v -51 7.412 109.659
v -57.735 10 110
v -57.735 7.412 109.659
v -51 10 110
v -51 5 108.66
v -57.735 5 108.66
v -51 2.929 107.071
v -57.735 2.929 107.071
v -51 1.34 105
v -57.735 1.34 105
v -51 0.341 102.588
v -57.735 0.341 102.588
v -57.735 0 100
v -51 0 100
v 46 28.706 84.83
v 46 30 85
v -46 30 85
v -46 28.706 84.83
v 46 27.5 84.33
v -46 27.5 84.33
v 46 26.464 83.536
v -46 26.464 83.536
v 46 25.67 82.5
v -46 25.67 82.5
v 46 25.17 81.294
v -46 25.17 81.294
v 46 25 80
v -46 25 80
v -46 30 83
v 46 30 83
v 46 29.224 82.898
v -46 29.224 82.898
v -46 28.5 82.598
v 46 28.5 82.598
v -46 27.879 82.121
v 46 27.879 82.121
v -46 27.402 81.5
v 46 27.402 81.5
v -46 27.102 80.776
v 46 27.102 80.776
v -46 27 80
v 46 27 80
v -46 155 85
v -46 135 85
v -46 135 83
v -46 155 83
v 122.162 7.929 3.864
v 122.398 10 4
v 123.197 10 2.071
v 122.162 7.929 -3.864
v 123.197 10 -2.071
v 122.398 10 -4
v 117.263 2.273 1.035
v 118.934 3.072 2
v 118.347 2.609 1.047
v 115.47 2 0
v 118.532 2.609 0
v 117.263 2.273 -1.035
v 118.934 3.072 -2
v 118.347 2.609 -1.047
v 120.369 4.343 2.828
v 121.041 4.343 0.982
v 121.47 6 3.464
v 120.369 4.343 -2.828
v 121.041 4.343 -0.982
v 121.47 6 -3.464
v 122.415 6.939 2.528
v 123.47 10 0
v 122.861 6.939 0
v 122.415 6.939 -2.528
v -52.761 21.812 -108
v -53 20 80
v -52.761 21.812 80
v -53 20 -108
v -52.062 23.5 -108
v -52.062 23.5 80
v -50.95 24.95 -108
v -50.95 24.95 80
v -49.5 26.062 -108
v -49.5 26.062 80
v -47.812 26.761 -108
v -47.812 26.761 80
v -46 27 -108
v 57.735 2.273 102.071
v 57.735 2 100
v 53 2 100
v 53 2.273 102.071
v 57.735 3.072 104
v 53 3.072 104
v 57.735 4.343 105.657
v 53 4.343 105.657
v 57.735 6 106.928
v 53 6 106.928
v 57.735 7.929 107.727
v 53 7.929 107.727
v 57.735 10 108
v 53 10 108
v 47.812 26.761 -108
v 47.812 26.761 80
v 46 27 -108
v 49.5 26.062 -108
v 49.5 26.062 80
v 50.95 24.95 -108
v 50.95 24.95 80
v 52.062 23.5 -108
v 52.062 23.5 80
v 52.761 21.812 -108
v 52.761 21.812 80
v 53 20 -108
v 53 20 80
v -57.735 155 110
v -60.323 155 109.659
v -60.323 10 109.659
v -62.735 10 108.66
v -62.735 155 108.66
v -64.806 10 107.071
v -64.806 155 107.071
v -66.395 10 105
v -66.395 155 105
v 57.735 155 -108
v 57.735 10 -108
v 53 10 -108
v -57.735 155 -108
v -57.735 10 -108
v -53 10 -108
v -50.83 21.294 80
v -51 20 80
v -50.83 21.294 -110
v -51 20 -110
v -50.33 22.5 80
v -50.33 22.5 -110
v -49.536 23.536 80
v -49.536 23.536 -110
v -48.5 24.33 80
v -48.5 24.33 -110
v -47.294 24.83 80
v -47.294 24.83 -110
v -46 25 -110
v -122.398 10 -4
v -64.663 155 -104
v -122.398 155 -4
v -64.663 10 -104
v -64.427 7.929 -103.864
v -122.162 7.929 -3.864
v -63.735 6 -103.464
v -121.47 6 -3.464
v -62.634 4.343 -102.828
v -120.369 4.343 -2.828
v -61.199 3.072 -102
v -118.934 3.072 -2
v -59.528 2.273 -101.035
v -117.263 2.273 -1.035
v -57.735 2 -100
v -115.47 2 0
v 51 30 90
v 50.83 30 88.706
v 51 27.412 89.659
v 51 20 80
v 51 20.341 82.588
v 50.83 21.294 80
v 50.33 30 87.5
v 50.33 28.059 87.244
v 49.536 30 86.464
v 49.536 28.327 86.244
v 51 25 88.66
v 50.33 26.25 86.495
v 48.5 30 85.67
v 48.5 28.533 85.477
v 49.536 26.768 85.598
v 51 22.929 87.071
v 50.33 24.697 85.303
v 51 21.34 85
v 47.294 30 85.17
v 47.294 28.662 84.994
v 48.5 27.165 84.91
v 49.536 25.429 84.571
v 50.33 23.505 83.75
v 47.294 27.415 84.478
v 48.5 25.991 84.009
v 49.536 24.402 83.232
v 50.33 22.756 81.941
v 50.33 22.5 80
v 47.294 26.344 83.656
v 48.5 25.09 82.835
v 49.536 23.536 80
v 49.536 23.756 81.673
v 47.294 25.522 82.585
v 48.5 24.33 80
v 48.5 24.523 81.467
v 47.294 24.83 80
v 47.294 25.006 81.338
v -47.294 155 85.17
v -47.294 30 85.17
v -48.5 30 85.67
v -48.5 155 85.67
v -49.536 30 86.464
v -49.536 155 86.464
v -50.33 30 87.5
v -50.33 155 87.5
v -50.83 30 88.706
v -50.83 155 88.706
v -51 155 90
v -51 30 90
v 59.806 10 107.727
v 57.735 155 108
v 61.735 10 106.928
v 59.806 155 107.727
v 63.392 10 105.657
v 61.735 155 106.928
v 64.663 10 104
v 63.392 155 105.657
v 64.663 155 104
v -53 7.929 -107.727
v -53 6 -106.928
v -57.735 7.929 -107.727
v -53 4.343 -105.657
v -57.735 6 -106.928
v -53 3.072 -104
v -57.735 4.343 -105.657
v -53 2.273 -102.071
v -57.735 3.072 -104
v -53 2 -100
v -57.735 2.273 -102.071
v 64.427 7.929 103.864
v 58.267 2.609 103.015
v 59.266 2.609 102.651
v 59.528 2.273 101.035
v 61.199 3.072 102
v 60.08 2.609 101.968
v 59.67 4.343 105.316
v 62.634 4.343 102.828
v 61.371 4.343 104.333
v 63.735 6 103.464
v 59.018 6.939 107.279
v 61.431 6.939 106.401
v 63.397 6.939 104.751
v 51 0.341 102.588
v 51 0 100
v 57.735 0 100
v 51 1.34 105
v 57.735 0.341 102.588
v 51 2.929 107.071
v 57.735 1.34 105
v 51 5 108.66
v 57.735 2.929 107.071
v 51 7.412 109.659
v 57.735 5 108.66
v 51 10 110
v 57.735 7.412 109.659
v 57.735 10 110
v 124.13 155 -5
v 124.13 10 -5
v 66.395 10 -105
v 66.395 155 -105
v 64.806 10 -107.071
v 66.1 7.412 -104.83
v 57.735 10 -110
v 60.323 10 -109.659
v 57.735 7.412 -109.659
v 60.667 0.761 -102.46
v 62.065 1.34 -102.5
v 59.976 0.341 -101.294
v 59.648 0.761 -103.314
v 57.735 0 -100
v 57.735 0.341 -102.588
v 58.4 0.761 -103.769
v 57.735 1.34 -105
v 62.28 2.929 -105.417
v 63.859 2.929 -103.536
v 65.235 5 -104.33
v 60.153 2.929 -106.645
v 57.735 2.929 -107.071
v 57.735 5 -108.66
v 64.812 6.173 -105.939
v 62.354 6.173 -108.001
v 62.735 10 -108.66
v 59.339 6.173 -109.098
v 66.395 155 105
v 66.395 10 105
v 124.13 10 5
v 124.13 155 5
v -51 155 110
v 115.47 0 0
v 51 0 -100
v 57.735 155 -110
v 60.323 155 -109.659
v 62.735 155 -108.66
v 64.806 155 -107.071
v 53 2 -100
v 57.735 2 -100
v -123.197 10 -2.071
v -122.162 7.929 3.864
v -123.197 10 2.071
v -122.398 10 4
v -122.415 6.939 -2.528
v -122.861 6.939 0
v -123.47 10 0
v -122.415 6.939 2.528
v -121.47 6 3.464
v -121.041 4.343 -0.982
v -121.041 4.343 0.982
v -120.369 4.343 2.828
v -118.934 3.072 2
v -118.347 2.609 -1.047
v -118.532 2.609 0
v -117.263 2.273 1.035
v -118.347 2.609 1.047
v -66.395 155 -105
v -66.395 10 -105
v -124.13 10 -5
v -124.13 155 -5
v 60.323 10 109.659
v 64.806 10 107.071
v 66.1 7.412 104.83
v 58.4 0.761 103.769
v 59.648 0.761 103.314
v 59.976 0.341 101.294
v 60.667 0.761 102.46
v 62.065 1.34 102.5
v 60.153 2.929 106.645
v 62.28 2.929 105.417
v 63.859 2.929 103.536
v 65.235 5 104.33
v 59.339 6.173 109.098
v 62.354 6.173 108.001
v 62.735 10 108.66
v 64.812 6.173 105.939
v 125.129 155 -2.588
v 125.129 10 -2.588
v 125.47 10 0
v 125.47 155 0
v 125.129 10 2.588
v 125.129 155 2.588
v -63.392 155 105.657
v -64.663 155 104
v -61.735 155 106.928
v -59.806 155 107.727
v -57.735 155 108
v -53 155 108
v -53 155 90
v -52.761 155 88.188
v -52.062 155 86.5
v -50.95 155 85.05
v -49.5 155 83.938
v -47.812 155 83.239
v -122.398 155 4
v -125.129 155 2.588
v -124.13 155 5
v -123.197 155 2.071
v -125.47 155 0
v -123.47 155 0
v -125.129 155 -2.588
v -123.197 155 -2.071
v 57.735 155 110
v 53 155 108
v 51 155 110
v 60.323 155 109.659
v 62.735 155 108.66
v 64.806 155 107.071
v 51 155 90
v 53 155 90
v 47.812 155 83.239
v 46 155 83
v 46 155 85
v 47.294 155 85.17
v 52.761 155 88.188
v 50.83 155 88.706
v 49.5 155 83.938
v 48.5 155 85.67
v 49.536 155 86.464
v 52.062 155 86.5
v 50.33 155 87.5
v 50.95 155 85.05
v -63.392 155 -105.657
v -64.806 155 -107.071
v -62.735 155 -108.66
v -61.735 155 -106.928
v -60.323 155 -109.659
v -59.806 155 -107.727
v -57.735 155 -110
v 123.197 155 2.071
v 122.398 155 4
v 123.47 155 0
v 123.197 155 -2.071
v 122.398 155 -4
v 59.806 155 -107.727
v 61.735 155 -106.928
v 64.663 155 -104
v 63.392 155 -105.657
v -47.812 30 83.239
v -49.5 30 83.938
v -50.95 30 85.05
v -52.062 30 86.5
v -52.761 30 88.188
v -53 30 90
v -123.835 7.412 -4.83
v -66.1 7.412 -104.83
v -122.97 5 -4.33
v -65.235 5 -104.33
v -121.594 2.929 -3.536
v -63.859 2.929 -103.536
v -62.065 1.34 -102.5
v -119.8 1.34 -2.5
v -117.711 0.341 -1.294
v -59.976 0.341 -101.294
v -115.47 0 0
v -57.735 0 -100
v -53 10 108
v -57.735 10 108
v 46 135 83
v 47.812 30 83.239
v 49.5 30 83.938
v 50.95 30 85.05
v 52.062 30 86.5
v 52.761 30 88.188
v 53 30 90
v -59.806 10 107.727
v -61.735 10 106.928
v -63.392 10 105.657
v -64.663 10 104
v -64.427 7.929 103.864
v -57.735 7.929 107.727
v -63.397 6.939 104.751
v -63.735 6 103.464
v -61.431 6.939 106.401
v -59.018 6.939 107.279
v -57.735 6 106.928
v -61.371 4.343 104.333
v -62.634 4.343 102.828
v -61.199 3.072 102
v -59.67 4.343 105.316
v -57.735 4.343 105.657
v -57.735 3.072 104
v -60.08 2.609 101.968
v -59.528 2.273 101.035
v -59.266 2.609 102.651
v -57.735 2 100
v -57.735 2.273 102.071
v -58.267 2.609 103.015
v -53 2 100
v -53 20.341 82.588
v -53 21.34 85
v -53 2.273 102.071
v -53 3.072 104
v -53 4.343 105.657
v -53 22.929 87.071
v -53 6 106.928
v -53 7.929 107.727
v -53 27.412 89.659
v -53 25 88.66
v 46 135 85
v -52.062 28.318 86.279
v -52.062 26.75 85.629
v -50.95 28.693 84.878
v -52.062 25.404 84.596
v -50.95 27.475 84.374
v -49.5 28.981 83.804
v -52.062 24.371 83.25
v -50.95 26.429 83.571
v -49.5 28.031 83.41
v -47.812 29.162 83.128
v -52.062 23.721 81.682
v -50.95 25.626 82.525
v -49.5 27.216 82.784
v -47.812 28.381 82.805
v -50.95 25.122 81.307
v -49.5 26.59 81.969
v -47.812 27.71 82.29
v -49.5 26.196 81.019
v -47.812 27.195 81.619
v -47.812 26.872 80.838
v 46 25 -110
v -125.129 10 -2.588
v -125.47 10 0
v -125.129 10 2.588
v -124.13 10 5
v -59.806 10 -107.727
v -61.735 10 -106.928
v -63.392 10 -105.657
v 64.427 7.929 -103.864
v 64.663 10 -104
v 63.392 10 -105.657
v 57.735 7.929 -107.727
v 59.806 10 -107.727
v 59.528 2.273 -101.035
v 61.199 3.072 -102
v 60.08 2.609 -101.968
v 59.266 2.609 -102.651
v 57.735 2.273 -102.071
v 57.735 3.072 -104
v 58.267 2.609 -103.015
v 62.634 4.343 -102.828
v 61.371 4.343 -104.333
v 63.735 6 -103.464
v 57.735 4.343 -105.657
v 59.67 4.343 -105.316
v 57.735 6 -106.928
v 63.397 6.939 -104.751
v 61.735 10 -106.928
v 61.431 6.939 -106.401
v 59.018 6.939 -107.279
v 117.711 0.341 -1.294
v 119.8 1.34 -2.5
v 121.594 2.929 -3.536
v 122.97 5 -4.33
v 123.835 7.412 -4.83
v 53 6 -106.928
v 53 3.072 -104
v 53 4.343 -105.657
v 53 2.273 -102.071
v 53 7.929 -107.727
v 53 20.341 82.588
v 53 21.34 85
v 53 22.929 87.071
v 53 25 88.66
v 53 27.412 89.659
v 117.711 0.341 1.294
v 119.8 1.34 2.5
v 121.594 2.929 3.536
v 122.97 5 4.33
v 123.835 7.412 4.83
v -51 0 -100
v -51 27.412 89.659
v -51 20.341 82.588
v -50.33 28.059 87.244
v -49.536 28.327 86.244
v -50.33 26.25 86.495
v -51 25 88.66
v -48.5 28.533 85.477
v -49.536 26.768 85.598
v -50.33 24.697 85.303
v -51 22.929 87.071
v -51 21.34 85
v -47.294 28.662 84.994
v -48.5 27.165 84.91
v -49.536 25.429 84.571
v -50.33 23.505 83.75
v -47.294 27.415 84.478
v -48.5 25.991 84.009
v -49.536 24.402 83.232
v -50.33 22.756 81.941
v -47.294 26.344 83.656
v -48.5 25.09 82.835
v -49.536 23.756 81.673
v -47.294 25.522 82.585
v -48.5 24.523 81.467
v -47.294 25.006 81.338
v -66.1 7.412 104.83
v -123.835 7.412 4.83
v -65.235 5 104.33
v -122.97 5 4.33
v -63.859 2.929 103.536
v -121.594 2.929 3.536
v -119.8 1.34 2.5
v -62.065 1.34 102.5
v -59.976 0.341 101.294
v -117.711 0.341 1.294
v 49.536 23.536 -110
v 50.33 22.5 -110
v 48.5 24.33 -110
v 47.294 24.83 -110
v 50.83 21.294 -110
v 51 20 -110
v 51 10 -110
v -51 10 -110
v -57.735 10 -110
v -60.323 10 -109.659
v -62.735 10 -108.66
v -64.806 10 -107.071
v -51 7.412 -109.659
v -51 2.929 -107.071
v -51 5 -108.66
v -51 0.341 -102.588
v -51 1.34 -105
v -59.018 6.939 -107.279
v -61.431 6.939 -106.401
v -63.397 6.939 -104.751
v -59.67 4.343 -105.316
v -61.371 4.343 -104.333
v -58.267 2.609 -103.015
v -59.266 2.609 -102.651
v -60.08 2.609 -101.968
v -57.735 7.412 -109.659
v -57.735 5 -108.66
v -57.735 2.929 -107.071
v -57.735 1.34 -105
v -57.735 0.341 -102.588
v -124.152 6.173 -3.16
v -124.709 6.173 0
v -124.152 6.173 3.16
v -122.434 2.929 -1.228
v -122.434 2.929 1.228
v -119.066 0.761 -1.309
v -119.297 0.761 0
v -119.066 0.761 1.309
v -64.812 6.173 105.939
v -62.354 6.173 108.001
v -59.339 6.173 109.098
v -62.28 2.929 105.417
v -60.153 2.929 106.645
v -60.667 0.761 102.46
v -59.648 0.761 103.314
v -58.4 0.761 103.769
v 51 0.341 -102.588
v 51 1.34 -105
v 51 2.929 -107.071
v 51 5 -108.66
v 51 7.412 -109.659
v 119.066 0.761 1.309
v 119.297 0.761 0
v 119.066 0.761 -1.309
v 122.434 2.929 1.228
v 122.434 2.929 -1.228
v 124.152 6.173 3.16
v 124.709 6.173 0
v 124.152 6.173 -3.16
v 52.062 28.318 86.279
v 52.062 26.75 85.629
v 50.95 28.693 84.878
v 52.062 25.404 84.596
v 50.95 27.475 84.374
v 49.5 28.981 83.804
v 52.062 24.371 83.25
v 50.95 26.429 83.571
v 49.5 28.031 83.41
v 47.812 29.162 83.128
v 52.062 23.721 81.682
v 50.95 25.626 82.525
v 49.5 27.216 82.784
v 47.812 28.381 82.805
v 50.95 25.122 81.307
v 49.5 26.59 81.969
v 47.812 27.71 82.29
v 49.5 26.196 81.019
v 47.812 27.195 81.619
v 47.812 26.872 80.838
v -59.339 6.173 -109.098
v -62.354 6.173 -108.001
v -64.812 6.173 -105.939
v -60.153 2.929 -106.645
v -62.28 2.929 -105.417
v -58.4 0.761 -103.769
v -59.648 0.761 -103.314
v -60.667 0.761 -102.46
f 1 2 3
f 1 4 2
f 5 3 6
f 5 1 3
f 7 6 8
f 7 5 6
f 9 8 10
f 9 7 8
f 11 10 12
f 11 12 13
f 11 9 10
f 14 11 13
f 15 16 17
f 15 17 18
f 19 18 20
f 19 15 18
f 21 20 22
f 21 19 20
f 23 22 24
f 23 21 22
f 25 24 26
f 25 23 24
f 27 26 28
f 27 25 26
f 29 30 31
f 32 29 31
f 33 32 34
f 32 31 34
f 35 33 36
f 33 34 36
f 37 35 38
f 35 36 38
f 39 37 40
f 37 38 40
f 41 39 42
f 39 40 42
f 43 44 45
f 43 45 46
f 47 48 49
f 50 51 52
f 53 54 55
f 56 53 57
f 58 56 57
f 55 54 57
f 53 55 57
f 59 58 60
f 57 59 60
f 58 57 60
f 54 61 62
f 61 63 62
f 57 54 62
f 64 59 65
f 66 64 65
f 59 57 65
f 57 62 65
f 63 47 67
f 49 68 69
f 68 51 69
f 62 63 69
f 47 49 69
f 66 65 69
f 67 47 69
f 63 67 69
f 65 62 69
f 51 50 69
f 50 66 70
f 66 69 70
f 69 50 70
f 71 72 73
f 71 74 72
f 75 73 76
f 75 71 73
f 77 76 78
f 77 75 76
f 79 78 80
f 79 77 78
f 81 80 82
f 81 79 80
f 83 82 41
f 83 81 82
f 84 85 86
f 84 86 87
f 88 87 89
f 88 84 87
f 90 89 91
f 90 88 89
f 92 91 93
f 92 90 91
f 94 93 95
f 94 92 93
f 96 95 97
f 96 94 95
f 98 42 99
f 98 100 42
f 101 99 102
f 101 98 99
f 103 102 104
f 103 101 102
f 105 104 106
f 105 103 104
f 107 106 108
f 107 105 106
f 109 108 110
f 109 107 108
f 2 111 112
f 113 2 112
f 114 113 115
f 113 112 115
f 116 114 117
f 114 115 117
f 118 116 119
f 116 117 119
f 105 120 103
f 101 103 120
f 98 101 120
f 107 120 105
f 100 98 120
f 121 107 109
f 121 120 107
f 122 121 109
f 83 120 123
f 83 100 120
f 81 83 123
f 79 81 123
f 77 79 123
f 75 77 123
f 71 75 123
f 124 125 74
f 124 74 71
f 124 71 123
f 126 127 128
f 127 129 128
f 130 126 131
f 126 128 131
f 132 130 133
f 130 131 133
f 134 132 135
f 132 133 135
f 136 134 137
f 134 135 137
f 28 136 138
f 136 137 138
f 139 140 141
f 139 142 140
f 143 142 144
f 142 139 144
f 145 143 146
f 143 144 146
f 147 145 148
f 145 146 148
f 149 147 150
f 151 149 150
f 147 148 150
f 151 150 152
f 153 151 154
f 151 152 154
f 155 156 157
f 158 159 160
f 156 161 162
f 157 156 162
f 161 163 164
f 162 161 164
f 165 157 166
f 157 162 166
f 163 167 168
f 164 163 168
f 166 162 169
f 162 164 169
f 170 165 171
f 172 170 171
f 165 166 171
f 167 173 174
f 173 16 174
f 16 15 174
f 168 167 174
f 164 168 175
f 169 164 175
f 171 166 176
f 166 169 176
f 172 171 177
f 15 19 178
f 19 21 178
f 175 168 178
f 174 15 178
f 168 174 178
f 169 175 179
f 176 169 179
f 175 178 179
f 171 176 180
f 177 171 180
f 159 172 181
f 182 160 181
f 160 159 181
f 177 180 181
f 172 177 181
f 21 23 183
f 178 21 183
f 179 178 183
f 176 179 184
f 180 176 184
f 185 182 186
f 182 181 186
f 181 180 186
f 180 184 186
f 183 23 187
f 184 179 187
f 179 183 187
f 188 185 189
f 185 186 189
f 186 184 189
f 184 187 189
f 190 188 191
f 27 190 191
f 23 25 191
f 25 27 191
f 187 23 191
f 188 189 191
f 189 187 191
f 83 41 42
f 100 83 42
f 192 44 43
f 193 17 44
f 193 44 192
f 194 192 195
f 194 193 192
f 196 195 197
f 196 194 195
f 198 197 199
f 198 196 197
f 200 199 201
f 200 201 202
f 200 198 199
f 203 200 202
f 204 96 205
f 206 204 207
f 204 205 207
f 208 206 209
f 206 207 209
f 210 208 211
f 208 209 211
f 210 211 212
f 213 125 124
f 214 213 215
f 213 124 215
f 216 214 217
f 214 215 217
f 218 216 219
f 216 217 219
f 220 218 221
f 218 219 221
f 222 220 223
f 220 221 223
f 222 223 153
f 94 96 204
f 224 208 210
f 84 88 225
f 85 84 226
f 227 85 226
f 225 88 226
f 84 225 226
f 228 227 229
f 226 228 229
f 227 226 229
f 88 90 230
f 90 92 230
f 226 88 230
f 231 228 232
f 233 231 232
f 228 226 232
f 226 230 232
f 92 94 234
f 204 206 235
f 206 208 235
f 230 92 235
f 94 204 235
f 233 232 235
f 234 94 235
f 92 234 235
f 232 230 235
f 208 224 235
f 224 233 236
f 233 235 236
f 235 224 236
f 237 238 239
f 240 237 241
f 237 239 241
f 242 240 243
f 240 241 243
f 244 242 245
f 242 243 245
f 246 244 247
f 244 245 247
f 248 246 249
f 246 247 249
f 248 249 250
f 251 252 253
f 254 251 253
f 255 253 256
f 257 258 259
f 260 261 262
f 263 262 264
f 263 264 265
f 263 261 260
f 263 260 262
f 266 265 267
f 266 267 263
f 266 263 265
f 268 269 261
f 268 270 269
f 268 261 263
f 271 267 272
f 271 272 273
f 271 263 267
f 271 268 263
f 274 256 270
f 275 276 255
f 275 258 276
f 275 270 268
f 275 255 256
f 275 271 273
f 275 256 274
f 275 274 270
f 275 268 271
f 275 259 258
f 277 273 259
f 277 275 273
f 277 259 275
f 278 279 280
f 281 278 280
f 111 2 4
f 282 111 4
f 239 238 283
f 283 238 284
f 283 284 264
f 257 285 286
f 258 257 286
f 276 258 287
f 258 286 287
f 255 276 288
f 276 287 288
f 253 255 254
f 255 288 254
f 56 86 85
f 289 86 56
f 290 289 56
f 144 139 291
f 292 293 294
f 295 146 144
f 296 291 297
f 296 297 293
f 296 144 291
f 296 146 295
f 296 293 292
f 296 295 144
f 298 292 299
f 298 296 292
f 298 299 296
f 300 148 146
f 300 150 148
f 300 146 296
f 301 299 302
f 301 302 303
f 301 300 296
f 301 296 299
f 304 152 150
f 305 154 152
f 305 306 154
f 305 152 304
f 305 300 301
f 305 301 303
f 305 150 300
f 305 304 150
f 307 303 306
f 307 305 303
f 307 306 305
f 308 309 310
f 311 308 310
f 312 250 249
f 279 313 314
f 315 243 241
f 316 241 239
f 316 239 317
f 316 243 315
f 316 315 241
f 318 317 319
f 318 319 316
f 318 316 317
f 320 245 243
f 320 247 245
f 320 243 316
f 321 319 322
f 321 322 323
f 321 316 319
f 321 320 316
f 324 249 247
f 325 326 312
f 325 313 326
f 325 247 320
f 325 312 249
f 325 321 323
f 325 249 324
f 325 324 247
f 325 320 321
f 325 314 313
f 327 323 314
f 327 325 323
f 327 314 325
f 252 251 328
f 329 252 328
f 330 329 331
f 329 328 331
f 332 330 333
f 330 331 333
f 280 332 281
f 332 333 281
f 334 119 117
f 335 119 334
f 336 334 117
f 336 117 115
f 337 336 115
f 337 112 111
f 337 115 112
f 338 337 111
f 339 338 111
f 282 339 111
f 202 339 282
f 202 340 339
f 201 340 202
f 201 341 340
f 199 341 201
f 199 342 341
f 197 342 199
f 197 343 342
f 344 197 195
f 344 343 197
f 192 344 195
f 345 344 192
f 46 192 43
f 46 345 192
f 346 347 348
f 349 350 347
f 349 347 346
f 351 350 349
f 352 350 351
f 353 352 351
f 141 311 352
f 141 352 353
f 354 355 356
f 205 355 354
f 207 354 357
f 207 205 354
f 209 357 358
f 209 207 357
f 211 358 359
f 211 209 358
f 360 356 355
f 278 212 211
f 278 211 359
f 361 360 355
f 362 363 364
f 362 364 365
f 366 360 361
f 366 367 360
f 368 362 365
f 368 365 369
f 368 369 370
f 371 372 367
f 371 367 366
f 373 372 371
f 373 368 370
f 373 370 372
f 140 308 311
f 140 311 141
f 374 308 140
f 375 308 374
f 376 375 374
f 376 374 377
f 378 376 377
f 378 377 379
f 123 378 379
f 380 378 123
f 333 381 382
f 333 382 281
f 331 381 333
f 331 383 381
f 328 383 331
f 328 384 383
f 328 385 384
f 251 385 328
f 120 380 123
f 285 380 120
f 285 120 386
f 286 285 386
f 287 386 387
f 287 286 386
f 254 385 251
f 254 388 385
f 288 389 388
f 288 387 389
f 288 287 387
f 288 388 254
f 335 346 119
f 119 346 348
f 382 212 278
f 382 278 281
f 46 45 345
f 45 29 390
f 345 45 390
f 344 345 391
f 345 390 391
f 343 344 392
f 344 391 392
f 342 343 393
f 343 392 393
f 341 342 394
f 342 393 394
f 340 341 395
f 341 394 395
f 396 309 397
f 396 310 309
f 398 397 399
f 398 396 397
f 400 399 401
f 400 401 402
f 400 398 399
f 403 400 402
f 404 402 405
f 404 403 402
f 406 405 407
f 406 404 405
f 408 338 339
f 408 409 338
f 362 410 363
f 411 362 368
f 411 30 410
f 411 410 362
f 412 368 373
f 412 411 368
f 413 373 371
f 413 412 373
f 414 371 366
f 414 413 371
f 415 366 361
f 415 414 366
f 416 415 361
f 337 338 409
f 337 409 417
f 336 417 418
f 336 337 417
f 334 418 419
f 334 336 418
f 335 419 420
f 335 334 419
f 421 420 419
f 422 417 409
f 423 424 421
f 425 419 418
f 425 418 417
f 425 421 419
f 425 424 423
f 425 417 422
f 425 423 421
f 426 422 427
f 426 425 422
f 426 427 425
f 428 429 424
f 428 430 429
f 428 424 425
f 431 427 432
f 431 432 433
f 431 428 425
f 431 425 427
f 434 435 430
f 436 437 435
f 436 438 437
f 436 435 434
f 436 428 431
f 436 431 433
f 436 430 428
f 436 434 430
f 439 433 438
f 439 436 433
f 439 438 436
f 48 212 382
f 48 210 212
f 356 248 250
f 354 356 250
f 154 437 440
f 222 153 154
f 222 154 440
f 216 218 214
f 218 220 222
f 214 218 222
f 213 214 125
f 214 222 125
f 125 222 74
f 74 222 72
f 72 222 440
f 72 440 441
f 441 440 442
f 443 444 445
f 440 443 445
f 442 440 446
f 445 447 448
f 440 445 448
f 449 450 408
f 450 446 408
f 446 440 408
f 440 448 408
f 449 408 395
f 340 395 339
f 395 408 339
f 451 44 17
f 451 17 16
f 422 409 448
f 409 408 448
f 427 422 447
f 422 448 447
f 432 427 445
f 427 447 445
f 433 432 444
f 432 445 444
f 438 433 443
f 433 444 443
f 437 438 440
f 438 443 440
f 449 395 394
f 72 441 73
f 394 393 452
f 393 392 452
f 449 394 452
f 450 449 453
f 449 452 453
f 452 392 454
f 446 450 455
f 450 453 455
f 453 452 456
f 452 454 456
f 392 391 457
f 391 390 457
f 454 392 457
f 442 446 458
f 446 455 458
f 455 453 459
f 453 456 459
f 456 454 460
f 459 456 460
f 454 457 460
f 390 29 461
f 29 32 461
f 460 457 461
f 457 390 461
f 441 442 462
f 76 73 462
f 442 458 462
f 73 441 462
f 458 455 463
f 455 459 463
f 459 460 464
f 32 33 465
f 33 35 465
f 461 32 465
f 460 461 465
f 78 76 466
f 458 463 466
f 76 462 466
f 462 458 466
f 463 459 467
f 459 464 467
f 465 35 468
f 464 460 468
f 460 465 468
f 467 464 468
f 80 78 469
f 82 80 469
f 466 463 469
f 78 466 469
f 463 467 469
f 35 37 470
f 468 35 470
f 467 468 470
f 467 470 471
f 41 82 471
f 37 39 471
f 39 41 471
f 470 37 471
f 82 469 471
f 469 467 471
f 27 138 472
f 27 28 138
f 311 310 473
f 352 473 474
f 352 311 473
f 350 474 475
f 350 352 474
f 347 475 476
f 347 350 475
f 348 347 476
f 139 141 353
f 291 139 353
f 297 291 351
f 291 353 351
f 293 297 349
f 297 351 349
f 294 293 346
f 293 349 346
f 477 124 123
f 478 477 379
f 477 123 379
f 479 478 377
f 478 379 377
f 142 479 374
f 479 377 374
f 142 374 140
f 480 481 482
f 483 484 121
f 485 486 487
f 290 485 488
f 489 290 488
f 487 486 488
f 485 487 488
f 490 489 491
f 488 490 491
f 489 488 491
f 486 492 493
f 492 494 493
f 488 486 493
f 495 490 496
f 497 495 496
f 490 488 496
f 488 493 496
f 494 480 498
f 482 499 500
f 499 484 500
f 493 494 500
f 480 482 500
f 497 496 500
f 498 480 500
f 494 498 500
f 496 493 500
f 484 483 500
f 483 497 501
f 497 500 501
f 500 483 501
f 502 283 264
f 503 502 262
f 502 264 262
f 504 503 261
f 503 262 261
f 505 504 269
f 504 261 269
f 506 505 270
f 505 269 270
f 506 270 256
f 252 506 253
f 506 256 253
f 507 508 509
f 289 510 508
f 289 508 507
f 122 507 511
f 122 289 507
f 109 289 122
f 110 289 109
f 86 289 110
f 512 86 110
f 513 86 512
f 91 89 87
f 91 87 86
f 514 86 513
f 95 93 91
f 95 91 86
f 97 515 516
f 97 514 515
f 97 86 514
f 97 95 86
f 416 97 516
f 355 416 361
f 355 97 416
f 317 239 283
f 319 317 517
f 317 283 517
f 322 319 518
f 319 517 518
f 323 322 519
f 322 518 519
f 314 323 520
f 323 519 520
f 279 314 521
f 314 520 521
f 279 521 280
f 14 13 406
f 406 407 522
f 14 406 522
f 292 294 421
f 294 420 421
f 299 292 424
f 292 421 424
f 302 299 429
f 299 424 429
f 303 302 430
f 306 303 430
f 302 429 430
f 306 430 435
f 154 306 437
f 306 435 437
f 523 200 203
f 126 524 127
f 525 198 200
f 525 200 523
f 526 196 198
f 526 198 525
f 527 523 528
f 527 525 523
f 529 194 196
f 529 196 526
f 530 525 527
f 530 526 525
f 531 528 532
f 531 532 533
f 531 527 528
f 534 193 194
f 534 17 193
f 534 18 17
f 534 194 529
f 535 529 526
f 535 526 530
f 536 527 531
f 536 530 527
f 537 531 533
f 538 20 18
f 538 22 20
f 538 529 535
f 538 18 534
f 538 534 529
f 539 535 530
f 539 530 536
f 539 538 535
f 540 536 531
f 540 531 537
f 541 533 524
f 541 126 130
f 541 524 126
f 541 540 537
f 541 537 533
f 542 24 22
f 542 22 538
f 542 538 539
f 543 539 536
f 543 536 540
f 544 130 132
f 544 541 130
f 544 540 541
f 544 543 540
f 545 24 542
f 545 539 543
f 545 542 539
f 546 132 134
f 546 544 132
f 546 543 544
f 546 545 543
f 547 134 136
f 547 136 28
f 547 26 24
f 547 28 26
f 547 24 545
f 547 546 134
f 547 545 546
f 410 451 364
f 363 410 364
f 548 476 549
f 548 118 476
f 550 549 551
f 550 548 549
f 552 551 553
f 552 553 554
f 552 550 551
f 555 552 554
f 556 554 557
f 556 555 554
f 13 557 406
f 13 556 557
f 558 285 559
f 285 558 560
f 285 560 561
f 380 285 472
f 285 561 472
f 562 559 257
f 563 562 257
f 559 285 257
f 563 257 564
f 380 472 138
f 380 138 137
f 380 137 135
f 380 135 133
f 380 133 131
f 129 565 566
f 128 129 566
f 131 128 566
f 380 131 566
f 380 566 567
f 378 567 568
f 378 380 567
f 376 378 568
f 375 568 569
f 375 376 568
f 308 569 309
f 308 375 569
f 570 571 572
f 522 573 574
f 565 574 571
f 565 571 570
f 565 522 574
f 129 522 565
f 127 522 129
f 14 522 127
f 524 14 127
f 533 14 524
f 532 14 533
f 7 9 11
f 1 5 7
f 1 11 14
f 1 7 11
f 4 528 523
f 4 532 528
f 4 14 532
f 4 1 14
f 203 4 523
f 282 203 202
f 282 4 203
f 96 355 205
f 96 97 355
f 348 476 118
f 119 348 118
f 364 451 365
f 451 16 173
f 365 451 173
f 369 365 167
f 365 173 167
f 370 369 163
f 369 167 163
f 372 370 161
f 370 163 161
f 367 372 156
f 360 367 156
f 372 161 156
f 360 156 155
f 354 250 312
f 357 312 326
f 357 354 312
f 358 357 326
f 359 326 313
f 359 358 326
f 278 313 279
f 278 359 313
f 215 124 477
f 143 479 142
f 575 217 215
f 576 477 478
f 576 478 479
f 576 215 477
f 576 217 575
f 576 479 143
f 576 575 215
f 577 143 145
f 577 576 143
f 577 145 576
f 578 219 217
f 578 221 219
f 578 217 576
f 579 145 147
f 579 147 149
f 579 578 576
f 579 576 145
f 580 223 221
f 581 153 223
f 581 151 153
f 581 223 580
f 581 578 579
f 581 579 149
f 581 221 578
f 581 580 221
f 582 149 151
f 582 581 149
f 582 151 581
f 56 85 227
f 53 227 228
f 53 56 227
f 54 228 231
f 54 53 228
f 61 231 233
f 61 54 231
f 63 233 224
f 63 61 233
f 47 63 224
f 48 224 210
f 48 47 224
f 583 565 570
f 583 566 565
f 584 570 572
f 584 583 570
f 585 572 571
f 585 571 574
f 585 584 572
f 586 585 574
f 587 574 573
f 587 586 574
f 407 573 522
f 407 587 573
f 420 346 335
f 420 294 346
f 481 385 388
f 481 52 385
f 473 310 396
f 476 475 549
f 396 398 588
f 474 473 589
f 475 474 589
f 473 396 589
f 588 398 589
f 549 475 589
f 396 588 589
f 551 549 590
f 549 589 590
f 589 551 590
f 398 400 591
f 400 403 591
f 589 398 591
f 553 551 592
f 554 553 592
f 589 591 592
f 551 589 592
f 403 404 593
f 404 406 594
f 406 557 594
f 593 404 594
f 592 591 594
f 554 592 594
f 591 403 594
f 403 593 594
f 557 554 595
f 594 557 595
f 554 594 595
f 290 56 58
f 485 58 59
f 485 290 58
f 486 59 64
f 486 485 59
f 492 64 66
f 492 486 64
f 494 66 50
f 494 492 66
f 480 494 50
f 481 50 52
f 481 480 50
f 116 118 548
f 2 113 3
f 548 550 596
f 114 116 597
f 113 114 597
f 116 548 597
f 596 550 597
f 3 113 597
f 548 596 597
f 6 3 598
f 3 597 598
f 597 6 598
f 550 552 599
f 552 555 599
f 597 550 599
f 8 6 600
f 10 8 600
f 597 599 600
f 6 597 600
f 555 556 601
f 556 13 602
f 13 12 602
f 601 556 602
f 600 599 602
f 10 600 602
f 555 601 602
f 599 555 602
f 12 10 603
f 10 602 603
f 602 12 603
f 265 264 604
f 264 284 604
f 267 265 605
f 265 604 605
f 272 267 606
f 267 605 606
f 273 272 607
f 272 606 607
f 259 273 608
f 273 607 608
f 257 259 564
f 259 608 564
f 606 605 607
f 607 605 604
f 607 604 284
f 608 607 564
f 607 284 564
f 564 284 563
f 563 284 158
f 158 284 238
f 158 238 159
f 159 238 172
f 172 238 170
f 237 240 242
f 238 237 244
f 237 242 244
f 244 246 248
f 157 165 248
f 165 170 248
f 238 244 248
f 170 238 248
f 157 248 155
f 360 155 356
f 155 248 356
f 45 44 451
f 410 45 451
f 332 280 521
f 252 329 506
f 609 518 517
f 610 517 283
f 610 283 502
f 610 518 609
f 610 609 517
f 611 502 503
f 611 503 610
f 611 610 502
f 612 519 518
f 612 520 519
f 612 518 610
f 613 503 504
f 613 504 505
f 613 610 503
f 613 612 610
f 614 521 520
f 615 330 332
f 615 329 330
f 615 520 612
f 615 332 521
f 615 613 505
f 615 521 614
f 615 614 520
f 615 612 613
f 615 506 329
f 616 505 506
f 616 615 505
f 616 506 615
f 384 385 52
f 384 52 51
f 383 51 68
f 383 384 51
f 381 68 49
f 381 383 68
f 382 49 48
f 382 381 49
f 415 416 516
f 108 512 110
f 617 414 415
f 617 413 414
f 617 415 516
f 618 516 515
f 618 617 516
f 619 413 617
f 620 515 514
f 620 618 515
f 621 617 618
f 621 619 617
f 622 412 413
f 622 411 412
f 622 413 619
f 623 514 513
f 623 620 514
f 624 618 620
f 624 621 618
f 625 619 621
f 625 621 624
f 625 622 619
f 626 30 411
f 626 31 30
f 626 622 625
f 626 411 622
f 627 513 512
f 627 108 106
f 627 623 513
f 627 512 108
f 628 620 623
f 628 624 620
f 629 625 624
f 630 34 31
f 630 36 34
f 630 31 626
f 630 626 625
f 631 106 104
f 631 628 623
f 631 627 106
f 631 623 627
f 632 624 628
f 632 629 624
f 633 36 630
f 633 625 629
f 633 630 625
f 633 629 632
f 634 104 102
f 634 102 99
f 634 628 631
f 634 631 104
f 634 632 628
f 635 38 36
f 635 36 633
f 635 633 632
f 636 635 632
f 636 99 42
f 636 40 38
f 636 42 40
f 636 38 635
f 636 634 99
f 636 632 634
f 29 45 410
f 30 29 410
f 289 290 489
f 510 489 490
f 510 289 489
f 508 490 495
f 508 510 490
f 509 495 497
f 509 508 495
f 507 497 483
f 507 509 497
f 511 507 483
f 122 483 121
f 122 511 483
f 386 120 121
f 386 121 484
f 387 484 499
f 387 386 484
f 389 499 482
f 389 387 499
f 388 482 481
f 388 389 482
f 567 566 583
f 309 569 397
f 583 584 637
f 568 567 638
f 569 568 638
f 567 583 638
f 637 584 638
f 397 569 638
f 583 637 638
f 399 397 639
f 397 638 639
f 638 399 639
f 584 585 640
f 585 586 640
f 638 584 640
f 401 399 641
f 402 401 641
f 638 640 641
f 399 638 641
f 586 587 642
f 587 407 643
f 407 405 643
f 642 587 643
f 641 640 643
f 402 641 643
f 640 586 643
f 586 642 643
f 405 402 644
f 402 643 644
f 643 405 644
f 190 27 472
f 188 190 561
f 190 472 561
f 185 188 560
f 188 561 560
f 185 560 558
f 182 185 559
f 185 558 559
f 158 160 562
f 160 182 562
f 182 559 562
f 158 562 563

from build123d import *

# Parameters (mm, degrees)
BOSS_EXTRUDE1_DEPTH = 155
CUT_EXTRUDE1_REACH  = 230.601
SKETCH2_W           = 102
SKETCH2_H           = 25
CUT_EXTRUDE2_REACH  = 281.613
SKETCH3_W           = 102
SKETCH3_H           = 25
FILLET1_R           = 5
FILLET2_R           = 10
FILLET4_R           = 10
SHELL1_T            = -2
CUT_EXTRUDE3_REACH  = 280.913
SKETCH9_W           = 92
SKETCH9_H           = 20


with BuildPart() as part:
    # Sketch1 → Boss-Extrude1 (new body)
    with BuildSketch(Plane(origin=(0, 0, 0), x_dir=(1, 0, 0), z_dir=(0, 1, 0))):
        Polygon((63.508529611, 110), (-63.508529611, 110), (-127.017059222, 0), (-63.508529611, -110), (63.508529611, -110), (127.017059222, 0), align=None)
    extrude(amount=BOSS_EXTRUDE1_DEPTH)

    # Sketch2 → Cut-Extrude1 (cut, up to next)
    with BuildSketch(Plane(origin=(0, 155, 0), x_dir=(1, 0, 0), z_dir=(0, 1, 0)), mode=Mode.PRIVATE) as cut_extrude1_sk1:
        with Locations((0, -97.5)):
            Rectangle(SKETCH2_W, SKETCH2_H)
    cut_extrude1_tool1 = extrude(cut_extrude1_sk1.sketch, amount=-CUT_EXTRUDE1_REACH, mode=Mode.PRIVATE) & part.part
    add(cut_extrude1_tool1.solids().sort_by_distance((0, 155, 97.5))[0], mode=Mode.SUBTRACT)

    # Sketch3 → Cut-Extrude2 (cut, up to next)
    with BuildSketch(Plane.XY.offset(85), mode=Mode.PRIVATE) as cut_extrude2_sk1:
        with Locations((0, 12.5)):
            Rectangle(SKETCH3_W, SKETCH3_H)
    cut_extrude2_tool1 = extrude(cut_extrude2_sk1.sketch, amount=-CUT_EXTRUDE2_REACH, mode=Mode.PRIVATE) & part.part
    add(cut_extrude2_tool1.solids().sort_by_distance((0, 12.5, 85))[0], mode=Mode.SUBTRACT)

    # Fillet1
    fillet1_edges = [part.edges().sort_by_distance(p)[0] for p in [
        (51, 90, 85),
        (-51, 90, 85),
        (-51, 25, -12.5),
        (51, 25, -12.5),
        (0, 25, 85),
    ]]
    fillet(fillet1_edges, radius=FILLET1_R)

    # Fillet2
    fillet2_edges = [part.edges().sort_by_distance(p)[0] for p in [
        (127.017059222, 77.5, 0),
        (63.508529611, 77.5, 110),
        (-63.508529611, 77.5, 110),
        (-127.017059222, 77.5, 0),
        (-63.508529611, 77.5, -110),
        (63.508529611, 77.5, -110),
    ]]
    fillet(fillet2_edges, radius=FILLET2_R)

    # Fillet4
    fillet4_edges = [part.edges().sort_by_distance(p)[0] for p in [
        (54.367513459, 0, 110),
        (-54.367513459, 0, -110),
        (95.262794416, 0, 55),
        (54.367513459, 0, -110),
        (95.262794416, 0, -55),
        (62.735026919, 0, -108.660254038),
        (125.470053838, 0, 0),
        (62.735026919, 0, 108.660254038),
        (-95.262794416, 0, -55),
        (-54.367513459, 0, 110),
        (-95.262794416, 0, 55),
        (-62.735026919, 0, 108.660254038),
        (-125.470053838, 0, 0),
        (-62.735026919, 0, -108.660254038),
    ]]
    fillet(fillet4_edges, radius=FILLET4_R)

    # Shell1
    shell1_openings = [part.faces().sort_by_distance(p)[0] for p in [
        (0, 155, -6.295757264),
    ]]
    offset(amount=SHELL1_T, openings=shell1_openings, kind=Kind.INTERSECTION)

    # Sketch9 → Cut-Extrude3 (cut, up to next)
    with BuildSketch(Plane.XY.offset(85), mode=Mode.PRIVATE) as cut_extrude3_sk1:
        with Locations((0, 145)):
            Rectangle(SKETCH9_W, SKETCH9_H)
    cut_extrude3_tool1 = extrude(cut_extrude3_sk1.sketch, amount=-CUT_EXTRUDE3_REACH, mode=Mode.PRIVATE) & part.part
    add(cut_extrude3_tool1.solids().sort_by_distance((0, 145, 85))[0], mode=Mode.SUBTRACT)


solid = part.part
